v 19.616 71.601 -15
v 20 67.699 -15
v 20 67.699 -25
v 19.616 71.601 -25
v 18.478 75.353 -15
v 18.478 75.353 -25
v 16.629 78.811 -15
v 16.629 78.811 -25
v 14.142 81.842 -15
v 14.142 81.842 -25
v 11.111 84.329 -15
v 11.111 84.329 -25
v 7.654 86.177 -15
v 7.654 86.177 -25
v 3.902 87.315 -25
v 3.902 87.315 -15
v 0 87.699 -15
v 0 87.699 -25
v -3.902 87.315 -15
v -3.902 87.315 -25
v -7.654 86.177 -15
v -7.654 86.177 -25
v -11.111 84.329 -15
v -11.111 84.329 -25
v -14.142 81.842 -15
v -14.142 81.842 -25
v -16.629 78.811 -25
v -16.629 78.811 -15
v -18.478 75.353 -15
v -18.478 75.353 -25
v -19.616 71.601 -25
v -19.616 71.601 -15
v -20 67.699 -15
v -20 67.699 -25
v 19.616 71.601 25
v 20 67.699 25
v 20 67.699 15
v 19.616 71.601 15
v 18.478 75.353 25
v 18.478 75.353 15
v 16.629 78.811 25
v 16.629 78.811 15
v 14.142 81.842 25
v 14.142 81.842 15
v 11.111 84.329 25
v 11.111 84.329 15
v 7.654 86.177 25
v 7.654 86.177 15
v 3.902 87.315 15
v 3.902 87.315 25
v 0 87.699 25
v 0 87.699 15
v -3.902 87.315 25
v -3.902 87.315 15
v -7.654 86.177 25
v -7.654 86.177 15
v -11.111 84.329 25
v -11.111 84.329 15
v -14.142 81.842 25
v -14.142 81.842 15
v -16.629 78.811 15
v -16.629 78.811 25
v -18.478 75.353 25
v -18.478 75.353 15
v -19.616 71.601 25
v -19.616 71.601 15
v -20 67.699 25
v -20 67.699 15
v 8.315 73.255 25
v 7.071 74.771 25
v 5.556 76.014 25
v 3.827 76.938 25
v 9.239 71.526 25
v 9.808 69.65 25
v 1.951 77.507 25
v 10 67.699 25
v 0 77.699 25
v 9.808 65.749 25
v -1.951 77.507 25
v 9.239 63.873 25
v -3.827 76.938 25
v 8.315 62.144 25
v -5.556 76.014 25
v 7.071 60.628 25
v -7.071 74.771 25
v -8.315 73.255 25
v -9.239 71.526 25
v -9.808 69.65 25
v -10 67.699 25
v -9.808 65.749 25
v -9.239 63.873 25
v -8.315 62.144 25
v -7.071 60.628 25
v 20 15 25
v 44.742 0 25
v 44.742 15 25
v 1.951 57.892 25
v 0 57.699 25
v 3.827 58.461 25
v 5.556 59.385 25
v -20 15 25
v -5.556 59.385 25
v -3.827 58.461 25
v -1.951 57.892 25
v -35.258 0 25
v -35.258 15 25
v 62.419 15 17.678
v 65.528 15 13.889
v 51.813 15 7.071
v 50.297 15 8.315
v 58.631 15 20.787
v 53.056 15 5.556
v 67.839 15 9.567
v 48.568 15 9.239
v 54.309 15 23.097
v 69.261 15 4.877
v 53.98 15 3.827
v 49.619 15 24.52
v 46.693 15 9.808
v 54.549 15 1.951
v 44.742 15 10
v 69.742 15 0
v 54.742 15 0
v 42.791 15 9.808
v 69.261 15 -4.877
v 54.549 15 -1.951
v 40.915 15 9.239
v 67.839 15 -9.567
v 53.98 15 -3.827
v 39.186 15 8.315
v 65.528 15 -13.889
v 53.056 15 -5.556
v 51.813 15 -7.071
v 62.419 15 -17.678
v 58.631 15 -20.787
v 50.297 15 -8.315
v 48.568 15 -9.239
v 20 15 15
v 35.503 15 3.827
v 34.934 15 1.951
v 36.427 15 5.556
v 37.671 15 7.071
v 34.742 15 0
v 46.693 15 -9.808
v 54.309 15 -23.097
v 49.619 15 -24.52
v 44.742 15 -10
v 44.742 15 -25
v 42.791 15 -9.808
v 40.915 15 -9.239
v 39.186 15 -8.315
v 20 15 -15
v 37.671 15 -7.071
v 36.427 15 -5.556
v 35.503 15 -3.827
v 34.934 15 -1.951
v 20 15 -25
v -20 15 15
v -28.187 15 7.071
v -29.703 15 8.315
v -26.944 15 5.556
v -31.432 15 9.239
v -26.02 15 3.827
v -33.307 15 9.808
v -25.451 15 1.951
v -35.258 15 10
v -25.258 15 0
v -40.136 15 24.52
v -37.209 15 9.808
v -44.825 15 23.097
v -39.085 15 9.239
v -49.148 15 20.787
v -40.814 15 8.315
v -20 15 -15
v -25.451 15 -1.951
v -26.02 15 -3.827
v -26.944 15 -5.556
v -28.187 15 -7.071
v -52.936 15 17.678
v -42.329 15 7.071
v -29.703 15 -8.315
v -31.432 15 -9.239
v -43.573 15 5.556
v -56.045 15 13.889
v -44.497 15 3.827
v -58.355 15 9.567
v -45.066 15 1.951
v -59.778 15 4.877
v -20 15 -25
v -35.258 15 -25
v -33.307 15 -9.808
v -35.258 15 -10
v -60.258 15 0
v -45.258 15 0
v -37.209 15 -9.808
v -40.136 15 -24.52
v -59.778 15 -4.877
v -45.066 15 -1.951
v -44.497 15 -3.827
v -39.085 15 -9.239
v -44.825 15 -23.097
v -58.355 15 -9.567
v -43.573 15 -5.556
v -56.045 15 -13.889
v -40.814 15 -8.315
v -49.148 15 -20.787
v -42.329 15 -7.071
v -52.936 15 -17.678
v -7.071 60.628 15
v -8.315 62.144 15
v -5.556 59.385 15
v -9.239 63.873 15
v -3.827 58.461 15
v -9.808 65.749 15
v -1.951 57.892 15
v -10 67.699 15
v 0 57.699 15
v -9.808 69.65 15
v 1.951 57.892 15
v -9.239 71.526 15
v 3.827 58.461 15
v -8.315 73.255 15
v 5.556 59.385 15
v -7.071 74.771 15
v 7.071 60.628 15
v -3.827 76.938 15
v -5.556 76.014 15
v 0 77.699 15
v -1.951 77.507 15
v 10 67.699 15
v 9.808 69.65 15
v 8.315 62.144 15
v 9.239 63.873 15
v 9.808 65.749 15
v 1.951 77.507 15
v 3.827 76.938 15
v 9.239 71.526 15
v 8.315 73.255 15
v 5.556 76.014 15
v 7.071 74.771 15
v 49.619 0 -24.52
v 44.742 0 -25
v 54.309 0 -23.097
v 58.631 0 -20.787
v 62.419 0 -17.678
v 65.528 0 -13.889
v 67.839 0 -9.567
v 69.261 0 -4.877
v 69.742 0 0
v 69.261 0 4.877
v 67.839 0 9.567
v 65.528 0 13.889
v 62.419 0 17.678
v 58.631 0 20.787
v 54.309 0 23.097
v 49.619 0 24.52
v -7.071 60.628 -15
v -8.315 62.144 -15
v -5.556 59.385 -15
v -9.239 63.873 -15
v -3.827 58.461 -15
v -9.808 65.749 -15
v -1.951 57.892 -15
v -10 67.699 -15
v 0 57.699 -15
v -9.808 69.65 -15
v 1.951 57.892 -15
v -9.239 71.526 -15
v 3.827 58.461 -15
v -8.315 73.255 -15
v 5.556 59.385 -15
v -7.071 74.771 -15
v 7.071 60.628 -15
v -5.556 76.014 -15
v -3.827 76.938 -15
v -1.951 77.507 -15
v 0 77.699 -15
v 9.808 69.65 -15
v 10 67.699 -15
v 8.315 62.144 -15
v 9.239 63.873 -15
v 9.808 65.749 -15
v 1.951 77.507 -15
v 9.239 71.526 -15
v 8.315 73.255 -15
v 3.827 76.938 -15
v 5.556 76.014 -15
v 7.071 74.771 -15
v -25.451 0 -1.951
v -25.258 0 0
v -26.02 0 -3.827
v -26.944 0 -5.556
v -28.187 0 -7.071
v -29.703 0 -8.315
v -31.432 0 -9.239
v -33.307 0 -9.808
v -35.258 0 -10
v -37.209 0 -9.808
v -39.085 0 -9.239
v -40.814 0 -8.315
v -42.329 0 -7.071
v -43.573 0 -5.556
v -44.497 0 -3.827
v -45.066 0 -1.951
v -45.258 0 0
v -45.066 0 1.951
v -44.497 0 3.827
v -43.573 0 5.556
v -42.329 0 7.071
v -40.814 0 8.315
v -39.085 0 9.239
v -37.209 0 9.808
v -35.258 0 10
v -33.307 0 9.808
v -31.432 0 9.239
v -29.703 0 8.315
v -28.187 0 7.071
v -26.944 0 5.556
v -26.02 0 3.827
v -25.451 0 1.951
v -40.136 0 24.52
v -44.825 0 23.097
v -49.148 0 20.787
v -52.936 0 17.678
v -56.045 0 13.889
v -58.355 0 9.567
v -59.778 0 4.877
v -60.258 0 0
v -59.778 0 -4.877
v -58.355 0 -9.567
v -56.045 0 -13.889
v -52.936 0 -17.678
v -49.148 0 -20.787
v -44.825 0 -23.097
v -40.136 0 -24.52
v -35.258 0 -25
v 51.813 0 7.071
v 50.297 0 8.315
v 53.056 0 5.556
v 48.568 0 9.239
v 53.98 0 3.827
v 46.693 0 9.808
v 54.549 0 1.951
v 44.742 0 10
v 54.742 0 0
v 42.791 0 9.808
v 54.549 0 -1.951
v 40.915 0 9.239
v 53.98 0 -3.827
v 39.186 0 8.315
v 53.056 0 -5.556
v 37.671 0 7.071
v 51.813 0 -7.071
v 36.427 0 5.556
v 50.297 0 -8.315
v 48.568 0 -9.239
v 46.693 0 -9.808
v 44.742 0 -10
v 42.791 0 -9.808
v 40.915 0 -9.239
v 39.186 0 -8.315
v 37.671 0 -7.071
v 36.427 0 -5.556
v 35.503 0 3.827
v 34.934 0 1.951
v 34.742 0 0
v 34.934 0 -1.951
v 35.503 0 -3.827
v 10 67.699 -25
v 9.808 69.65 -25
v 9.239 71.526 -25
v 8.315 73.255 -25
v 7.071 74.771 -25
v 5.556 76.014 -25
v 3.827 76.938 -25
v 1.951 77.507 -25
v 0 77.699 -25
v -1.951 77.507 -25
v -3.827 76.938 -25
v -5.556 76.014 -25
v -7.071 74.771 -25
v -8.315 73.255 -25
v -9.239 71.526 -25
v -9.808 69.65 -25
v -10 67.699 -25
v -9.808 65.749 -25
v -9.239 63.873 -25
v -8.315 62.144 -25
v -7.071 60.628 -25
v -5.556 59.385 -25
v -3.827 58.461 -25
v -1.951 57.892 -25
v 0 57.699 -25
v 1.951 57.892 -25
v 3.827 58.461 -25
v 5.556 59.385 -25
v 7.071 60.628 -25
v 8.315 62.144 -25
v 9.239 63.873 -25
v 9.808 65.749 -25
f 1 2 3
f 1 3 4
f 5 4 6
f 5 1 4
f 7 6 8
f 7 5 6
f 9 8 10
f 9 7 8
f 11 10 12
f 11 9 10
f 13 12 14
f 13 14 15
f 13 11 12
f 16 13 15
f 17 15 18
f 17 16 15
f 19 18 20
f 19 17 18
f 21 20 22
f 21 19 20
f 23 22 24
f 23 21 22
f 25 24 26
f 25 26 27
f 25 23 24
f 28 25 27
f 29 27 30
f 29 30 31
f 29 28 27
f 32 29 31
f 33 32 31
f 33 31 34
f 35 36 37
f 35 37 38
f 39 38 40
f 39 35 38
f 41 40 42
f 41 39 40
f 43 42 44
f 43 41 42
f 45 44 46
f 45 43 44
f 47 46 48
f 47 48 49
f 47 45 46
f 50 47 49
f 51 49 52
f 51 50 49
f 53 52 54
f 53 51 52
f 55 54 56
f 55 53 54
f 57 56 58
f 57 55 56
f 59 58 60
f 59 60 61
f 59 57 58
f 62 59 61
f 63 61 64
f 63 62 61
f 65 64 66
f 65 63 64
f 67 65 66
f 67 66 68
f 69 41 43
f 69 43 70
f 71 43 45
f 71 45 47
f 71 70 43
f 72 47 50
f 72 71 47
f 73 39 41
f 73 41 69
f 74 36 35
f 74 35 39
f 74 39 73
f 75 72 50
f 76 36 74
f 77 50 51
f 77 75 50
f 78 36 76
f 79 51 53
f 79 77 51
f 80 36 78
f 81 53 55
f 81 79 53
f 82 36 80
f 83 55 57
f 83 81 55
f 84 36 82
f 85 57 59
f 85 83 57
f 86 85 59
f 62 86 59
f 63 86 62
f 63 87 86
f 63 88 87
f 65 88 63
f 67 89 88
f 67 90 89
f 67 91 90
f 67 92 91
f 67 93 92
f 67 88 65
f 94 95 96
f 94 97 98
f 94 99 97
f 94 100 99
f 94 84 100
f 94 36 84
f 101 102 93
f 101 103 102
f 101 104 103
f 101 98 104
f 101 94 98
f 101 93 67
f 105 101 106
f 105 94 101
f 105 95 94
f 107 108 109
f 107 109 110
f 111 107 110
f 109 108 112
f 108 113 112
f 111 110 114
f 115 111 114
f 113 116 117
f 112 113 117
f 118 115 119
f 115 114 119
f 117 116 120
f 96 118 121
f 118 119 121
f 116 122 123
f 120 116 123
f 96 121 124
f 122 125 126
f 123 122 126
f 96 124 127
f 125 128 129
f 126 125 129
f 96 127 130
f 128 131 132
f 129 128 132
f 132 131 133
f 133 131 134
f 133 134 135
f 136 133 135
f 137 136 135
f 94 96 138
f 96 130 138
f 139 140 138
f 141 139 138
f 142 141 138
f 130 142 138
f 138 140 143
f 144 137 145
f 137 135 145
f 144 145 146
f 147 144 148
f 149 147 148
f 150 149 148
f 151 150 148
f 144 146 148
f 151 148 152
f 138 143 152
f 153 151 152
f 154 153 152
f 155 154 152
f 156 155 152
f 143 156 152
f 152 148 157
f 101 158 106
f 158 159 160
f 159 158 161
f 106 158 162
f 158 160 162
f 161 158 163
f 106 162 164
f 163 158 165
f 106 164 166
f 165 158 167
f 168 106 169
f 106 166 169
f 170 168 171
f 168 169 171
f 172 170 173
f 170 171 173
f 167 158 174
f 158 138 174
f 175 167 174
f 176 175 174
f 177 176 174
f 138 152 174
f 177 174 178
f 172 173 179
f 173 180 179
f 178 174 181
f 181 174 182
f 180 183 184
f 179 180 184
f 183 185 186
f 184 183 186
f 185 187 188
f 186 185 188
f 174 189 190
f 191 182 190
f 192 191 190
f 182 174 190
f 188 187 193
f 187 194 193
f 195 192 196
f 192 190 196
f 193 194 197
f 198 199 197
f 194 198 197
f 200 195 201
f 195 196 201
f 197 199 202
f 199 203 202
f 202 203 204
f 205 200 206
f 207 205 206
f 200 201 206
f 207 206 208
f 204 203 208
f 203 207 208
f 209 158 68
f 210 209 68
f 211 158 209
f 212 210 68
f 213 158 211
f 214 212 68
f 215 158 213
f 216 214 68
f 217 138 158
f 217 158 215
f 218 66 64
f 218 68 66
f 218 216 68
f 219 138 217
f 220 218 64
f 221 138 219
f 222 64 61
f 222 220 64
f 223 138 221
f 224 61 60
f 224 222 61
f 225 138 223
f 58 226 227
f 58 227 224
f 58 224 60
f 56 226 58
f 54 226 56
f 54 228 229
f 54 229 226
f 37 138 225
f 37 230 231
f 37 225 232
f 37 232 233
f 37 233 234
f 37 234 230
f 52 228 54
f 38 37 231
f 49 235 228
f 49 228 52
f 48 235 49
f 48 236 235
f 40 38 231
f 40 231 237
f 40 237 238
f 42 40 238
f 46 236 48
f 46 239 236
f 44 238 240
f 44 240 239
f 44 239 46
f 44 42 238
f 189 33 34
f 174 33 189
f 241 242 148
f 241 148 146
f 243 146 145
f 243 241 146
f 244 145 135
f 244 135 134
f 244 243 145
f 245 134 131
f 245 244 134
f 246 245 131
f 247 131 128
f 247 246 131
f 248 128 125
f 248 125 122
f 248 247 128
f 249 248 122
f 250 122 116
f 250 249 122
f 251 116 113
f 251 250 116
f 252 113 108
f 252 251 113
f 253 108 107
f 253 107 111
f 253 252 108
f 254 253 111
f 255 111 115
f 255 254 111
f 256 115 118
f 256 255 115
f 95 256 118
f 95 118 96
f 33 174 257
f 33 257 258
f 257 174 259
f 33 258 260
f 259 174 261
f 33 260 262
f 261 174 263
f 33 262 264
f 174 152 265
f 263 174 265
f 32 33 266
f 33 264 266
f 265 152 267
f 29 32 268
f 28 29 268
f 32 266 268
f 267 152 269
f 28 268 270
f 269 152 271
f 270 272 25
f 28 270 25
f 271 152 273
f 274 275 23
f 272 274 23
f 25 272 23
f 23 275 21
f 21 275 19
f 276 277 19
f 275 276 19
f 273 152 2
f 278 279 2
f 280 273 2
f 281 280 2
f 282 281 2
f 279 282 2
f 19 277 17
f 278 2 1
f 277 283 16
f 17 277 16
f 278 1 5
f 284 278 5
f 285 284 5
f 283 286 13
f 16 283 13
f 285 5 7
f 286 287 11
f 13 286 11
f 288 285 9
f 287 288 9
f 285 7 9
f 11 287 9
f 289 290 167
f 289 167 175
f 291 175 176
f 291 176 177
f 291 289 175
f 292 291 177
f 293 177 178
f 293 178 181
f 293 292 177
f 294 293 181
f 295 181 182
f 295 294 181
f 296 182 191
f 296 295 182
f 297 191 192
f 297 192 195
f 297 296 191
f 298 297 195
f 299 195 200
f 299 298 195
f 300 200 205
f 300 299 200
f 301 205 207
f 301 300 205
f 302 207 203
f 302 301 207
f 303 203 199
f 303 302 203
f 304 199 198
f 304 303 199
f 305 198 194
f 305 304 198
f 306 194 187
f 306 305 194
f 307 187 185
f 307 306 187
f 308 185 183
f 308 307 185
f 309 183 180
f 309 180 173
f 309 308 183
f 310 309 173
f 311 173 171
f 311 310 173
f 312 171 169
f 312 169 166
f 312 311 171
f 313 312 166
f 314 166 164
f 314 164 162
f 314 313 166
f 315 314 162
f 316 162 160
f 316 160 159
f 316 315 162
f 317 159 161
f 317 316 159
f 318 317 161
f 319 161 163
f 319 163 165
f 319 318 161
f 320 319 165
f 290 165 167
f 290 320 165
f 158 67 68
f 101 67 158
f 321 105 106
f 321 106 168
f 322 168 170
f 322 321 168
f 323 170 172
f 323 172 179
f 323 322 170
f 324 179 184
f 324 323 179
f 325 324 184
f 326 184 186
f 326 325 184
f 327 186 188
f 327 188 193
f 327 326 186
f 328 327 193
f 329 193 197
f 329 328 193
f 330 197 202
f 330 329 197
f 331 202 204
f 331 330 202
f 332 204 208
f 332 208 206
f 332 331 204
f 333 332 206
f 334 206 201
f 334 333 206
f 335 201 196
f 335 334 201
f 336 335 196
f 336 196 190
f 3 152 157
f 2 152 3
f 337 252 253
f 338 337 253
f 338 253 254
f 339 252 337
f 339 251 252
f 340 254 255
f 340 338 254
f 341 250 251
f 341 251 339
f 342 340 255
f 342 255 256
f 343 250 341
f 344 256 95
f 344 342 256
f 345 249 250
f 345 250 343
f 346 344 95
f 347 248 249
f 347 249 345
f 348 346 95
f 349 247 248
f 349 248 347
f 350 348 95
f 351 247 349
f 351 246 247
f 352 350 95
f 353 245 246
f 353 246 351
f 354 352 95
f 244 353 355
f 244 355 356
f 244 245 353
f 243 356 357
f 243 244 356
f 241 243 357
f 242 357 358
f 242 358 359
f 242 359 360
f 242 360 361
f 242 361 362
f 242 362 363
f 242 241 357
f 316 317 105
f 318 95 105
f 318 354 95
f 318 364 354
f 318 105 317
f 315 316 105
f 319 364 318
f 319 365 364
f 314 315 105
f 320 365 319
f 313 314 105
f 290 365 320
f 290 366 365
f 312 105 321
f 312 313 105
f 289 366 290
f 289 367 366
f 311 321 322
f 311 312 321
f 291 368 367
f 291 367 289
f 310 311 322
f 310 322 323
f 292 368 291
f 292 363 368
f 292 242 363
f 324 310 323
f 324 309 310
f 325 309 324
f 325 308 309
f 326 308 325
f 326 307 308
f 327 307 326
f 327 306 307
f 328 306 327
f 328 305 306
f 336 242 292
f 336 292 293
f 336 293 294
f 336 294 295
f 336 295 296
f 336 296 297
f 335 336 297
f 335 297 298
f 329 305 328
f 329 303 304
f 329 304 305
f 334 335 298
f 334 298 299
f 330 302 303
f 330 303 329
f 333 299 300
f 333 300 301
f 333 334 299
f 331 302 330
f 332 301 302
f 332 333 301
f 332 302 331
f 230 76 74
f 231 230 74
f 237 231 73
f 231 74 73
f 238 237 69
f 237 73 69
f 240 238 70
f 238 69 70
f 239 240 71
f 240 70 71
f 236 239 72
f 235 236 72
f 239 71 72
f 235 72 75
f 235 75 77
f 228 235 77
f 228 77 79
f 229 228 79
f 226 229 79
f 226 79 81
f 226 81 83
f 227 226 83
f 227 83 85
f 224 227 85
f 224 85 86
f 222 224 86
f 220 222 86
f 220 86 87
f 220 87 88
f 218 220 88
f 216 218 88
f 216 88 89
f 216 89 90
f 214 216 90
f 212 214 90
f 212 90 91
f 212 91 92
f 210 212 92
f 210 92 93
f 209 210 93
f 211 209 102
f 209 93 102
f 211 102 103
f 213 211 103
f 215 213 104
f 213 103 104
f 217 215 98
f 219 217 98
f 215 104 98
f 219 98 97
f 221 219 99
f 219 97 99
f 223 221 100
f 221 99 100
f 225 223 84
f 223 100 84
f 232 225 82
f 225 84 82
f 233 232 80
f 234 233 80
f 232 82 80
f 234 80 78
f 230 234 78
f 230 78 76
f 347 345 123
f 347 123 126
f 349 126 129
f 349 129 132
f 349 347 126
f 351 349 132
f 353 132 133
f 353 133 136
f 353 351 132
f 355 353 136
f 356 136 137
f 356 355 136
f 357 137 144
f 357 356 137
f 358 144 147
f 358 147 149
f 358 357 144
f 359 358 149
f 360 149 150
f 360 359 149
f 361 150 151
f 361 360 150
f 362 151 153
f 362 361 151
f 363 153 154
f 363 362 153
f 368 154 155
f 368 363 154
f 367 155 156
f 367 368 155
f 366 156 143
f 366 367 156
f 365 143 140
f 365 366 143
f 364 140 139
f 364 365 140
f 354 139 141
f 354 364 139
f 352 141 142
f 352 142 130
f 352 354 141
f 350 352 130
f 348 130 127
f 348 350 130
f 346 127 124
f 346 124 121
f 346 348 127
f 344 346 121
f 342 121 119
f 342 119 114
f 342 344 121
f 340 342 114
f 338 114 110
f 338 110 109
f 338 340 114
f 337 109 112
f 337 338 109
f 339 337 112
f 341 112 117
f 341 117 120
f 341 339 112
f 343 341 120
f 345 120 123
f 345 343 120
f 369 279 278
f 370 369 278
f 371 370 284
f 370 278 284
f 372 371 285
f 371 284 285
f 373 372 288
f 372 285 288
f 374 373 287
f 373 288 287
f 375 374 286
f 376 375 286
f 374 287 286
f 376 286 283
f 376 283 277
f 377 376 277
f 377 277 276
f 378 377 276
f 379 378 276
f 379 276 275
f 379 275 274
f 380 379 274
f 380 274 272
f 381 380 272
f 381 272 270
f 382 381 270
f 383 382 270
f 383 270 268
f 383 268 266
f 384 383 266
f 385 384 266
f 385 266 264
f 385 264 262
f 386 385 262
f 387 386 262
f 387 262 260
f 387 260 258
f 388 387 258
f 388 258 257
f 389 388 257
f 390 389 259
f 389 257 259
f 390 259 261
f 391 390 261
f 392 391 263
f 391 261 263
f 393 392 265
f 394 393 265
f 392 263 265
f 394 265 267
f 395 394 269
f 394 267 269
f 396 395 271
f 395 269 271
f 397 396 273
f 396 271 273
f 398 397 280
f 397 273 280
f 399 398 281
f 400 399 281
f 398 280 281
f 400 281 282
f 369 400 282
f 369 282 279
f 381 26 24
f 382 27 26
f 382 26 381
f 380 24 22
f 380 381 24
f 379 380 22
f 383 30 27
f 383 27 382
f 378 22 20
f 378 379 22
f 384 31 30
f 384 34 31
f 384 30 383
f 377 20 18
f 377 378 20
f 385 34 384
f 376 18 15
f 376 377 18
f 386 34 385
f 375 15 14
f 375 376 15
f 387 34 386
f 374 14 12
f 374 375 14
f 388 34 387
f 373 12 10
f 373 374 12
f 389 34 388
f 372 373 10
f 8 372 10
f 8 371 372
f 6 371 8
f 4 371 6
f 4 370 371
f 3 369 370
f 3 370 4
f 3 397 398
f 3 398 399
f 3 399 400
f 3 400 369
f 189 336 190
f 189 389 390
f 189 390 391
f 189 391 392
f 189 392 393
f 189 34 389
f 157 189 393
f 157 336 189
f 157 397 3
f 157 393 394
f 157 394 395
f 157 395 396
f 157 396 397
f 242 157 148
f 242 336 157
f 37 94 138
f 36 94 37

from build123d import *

# Parameters (mm, degrees)
SKETCH2_R           = 10
BOSS_EXTRUDE1_DEPTH = 15
SKETCH4_R           = 10
BOSS_EXTRUDE2_DEPTH = 50
SKETCH5_W           = 30
SKETCH5_H           = 72.699493752
CUT_EXTRUDE1_DEPTH  = 25


with BuildPart() as part:
    # Sketch2 → Boss-Extrude1 (new body)
    with BuildSketch(Plane(origin=(0, 0, 0), x_dir=(1, 0, 0), z_dir=(0, 1, 0))):
        with BuildLine():
            Line((-35.258358851, 25), (44.741641149, 25))
            ThreePointArc((44.741641149, 25), (69.741641149, 0), (44.741641149, -25))
            Line((44.741641149, -25), (-35.258358851, -25))
            ThreePointArc((-35.258358851, -25), (-60.258358851, 0), (-35.258358851, 25))
        make_face()
        with Locations((-35.258358851, 0)):
            Circle(SKETCH2_R, mode=Mode.SUBTRACT)
        with Locations((44.741641149, 0)):
            Circle(SKETCH2_R, mode=Mode.SUBTRACT)
    extrude(amount=BOSS_EXTRUDE1_DEPTH)

    # Sketch4 → Boss-Extrude2 (add)
    with BuildSketch(Plane.XY.offset(25)):
        with BuildLine():
            Line((-20, 67.699493752), (-20, 15))
            Line((-20, 15), (20, 15))
            Line((20, 15), (20, 67.699493752))
            ThreePointArc((20, 67.699493752), (0, 87.699493752), (-20, 67.699493752))
        make_face()
        with Locations((0, 67.699493752)):
            Circle(SKETCH4_R, mode=Mode.SUBTRACT)
    extrude(amount=-BOSS_EXTRUDE2_DEPTH)

    # Sketch5 → Cut-Extrude1 (cut, symmetric)
    with BuildSketch(Plane(origin=(0, 0, 0), x_dir=(0, 0, -1), z_dir=(1, 0, 0))):
        with Locations((0, 51.349746876)):
            Rectangle(SKETCH5_W, SKETCH5_H)
    extrude(amount=CUT_EXTRUDE1_DEPTH, both=True, mode=Mode.SUBTRACT)


solid = part.part
